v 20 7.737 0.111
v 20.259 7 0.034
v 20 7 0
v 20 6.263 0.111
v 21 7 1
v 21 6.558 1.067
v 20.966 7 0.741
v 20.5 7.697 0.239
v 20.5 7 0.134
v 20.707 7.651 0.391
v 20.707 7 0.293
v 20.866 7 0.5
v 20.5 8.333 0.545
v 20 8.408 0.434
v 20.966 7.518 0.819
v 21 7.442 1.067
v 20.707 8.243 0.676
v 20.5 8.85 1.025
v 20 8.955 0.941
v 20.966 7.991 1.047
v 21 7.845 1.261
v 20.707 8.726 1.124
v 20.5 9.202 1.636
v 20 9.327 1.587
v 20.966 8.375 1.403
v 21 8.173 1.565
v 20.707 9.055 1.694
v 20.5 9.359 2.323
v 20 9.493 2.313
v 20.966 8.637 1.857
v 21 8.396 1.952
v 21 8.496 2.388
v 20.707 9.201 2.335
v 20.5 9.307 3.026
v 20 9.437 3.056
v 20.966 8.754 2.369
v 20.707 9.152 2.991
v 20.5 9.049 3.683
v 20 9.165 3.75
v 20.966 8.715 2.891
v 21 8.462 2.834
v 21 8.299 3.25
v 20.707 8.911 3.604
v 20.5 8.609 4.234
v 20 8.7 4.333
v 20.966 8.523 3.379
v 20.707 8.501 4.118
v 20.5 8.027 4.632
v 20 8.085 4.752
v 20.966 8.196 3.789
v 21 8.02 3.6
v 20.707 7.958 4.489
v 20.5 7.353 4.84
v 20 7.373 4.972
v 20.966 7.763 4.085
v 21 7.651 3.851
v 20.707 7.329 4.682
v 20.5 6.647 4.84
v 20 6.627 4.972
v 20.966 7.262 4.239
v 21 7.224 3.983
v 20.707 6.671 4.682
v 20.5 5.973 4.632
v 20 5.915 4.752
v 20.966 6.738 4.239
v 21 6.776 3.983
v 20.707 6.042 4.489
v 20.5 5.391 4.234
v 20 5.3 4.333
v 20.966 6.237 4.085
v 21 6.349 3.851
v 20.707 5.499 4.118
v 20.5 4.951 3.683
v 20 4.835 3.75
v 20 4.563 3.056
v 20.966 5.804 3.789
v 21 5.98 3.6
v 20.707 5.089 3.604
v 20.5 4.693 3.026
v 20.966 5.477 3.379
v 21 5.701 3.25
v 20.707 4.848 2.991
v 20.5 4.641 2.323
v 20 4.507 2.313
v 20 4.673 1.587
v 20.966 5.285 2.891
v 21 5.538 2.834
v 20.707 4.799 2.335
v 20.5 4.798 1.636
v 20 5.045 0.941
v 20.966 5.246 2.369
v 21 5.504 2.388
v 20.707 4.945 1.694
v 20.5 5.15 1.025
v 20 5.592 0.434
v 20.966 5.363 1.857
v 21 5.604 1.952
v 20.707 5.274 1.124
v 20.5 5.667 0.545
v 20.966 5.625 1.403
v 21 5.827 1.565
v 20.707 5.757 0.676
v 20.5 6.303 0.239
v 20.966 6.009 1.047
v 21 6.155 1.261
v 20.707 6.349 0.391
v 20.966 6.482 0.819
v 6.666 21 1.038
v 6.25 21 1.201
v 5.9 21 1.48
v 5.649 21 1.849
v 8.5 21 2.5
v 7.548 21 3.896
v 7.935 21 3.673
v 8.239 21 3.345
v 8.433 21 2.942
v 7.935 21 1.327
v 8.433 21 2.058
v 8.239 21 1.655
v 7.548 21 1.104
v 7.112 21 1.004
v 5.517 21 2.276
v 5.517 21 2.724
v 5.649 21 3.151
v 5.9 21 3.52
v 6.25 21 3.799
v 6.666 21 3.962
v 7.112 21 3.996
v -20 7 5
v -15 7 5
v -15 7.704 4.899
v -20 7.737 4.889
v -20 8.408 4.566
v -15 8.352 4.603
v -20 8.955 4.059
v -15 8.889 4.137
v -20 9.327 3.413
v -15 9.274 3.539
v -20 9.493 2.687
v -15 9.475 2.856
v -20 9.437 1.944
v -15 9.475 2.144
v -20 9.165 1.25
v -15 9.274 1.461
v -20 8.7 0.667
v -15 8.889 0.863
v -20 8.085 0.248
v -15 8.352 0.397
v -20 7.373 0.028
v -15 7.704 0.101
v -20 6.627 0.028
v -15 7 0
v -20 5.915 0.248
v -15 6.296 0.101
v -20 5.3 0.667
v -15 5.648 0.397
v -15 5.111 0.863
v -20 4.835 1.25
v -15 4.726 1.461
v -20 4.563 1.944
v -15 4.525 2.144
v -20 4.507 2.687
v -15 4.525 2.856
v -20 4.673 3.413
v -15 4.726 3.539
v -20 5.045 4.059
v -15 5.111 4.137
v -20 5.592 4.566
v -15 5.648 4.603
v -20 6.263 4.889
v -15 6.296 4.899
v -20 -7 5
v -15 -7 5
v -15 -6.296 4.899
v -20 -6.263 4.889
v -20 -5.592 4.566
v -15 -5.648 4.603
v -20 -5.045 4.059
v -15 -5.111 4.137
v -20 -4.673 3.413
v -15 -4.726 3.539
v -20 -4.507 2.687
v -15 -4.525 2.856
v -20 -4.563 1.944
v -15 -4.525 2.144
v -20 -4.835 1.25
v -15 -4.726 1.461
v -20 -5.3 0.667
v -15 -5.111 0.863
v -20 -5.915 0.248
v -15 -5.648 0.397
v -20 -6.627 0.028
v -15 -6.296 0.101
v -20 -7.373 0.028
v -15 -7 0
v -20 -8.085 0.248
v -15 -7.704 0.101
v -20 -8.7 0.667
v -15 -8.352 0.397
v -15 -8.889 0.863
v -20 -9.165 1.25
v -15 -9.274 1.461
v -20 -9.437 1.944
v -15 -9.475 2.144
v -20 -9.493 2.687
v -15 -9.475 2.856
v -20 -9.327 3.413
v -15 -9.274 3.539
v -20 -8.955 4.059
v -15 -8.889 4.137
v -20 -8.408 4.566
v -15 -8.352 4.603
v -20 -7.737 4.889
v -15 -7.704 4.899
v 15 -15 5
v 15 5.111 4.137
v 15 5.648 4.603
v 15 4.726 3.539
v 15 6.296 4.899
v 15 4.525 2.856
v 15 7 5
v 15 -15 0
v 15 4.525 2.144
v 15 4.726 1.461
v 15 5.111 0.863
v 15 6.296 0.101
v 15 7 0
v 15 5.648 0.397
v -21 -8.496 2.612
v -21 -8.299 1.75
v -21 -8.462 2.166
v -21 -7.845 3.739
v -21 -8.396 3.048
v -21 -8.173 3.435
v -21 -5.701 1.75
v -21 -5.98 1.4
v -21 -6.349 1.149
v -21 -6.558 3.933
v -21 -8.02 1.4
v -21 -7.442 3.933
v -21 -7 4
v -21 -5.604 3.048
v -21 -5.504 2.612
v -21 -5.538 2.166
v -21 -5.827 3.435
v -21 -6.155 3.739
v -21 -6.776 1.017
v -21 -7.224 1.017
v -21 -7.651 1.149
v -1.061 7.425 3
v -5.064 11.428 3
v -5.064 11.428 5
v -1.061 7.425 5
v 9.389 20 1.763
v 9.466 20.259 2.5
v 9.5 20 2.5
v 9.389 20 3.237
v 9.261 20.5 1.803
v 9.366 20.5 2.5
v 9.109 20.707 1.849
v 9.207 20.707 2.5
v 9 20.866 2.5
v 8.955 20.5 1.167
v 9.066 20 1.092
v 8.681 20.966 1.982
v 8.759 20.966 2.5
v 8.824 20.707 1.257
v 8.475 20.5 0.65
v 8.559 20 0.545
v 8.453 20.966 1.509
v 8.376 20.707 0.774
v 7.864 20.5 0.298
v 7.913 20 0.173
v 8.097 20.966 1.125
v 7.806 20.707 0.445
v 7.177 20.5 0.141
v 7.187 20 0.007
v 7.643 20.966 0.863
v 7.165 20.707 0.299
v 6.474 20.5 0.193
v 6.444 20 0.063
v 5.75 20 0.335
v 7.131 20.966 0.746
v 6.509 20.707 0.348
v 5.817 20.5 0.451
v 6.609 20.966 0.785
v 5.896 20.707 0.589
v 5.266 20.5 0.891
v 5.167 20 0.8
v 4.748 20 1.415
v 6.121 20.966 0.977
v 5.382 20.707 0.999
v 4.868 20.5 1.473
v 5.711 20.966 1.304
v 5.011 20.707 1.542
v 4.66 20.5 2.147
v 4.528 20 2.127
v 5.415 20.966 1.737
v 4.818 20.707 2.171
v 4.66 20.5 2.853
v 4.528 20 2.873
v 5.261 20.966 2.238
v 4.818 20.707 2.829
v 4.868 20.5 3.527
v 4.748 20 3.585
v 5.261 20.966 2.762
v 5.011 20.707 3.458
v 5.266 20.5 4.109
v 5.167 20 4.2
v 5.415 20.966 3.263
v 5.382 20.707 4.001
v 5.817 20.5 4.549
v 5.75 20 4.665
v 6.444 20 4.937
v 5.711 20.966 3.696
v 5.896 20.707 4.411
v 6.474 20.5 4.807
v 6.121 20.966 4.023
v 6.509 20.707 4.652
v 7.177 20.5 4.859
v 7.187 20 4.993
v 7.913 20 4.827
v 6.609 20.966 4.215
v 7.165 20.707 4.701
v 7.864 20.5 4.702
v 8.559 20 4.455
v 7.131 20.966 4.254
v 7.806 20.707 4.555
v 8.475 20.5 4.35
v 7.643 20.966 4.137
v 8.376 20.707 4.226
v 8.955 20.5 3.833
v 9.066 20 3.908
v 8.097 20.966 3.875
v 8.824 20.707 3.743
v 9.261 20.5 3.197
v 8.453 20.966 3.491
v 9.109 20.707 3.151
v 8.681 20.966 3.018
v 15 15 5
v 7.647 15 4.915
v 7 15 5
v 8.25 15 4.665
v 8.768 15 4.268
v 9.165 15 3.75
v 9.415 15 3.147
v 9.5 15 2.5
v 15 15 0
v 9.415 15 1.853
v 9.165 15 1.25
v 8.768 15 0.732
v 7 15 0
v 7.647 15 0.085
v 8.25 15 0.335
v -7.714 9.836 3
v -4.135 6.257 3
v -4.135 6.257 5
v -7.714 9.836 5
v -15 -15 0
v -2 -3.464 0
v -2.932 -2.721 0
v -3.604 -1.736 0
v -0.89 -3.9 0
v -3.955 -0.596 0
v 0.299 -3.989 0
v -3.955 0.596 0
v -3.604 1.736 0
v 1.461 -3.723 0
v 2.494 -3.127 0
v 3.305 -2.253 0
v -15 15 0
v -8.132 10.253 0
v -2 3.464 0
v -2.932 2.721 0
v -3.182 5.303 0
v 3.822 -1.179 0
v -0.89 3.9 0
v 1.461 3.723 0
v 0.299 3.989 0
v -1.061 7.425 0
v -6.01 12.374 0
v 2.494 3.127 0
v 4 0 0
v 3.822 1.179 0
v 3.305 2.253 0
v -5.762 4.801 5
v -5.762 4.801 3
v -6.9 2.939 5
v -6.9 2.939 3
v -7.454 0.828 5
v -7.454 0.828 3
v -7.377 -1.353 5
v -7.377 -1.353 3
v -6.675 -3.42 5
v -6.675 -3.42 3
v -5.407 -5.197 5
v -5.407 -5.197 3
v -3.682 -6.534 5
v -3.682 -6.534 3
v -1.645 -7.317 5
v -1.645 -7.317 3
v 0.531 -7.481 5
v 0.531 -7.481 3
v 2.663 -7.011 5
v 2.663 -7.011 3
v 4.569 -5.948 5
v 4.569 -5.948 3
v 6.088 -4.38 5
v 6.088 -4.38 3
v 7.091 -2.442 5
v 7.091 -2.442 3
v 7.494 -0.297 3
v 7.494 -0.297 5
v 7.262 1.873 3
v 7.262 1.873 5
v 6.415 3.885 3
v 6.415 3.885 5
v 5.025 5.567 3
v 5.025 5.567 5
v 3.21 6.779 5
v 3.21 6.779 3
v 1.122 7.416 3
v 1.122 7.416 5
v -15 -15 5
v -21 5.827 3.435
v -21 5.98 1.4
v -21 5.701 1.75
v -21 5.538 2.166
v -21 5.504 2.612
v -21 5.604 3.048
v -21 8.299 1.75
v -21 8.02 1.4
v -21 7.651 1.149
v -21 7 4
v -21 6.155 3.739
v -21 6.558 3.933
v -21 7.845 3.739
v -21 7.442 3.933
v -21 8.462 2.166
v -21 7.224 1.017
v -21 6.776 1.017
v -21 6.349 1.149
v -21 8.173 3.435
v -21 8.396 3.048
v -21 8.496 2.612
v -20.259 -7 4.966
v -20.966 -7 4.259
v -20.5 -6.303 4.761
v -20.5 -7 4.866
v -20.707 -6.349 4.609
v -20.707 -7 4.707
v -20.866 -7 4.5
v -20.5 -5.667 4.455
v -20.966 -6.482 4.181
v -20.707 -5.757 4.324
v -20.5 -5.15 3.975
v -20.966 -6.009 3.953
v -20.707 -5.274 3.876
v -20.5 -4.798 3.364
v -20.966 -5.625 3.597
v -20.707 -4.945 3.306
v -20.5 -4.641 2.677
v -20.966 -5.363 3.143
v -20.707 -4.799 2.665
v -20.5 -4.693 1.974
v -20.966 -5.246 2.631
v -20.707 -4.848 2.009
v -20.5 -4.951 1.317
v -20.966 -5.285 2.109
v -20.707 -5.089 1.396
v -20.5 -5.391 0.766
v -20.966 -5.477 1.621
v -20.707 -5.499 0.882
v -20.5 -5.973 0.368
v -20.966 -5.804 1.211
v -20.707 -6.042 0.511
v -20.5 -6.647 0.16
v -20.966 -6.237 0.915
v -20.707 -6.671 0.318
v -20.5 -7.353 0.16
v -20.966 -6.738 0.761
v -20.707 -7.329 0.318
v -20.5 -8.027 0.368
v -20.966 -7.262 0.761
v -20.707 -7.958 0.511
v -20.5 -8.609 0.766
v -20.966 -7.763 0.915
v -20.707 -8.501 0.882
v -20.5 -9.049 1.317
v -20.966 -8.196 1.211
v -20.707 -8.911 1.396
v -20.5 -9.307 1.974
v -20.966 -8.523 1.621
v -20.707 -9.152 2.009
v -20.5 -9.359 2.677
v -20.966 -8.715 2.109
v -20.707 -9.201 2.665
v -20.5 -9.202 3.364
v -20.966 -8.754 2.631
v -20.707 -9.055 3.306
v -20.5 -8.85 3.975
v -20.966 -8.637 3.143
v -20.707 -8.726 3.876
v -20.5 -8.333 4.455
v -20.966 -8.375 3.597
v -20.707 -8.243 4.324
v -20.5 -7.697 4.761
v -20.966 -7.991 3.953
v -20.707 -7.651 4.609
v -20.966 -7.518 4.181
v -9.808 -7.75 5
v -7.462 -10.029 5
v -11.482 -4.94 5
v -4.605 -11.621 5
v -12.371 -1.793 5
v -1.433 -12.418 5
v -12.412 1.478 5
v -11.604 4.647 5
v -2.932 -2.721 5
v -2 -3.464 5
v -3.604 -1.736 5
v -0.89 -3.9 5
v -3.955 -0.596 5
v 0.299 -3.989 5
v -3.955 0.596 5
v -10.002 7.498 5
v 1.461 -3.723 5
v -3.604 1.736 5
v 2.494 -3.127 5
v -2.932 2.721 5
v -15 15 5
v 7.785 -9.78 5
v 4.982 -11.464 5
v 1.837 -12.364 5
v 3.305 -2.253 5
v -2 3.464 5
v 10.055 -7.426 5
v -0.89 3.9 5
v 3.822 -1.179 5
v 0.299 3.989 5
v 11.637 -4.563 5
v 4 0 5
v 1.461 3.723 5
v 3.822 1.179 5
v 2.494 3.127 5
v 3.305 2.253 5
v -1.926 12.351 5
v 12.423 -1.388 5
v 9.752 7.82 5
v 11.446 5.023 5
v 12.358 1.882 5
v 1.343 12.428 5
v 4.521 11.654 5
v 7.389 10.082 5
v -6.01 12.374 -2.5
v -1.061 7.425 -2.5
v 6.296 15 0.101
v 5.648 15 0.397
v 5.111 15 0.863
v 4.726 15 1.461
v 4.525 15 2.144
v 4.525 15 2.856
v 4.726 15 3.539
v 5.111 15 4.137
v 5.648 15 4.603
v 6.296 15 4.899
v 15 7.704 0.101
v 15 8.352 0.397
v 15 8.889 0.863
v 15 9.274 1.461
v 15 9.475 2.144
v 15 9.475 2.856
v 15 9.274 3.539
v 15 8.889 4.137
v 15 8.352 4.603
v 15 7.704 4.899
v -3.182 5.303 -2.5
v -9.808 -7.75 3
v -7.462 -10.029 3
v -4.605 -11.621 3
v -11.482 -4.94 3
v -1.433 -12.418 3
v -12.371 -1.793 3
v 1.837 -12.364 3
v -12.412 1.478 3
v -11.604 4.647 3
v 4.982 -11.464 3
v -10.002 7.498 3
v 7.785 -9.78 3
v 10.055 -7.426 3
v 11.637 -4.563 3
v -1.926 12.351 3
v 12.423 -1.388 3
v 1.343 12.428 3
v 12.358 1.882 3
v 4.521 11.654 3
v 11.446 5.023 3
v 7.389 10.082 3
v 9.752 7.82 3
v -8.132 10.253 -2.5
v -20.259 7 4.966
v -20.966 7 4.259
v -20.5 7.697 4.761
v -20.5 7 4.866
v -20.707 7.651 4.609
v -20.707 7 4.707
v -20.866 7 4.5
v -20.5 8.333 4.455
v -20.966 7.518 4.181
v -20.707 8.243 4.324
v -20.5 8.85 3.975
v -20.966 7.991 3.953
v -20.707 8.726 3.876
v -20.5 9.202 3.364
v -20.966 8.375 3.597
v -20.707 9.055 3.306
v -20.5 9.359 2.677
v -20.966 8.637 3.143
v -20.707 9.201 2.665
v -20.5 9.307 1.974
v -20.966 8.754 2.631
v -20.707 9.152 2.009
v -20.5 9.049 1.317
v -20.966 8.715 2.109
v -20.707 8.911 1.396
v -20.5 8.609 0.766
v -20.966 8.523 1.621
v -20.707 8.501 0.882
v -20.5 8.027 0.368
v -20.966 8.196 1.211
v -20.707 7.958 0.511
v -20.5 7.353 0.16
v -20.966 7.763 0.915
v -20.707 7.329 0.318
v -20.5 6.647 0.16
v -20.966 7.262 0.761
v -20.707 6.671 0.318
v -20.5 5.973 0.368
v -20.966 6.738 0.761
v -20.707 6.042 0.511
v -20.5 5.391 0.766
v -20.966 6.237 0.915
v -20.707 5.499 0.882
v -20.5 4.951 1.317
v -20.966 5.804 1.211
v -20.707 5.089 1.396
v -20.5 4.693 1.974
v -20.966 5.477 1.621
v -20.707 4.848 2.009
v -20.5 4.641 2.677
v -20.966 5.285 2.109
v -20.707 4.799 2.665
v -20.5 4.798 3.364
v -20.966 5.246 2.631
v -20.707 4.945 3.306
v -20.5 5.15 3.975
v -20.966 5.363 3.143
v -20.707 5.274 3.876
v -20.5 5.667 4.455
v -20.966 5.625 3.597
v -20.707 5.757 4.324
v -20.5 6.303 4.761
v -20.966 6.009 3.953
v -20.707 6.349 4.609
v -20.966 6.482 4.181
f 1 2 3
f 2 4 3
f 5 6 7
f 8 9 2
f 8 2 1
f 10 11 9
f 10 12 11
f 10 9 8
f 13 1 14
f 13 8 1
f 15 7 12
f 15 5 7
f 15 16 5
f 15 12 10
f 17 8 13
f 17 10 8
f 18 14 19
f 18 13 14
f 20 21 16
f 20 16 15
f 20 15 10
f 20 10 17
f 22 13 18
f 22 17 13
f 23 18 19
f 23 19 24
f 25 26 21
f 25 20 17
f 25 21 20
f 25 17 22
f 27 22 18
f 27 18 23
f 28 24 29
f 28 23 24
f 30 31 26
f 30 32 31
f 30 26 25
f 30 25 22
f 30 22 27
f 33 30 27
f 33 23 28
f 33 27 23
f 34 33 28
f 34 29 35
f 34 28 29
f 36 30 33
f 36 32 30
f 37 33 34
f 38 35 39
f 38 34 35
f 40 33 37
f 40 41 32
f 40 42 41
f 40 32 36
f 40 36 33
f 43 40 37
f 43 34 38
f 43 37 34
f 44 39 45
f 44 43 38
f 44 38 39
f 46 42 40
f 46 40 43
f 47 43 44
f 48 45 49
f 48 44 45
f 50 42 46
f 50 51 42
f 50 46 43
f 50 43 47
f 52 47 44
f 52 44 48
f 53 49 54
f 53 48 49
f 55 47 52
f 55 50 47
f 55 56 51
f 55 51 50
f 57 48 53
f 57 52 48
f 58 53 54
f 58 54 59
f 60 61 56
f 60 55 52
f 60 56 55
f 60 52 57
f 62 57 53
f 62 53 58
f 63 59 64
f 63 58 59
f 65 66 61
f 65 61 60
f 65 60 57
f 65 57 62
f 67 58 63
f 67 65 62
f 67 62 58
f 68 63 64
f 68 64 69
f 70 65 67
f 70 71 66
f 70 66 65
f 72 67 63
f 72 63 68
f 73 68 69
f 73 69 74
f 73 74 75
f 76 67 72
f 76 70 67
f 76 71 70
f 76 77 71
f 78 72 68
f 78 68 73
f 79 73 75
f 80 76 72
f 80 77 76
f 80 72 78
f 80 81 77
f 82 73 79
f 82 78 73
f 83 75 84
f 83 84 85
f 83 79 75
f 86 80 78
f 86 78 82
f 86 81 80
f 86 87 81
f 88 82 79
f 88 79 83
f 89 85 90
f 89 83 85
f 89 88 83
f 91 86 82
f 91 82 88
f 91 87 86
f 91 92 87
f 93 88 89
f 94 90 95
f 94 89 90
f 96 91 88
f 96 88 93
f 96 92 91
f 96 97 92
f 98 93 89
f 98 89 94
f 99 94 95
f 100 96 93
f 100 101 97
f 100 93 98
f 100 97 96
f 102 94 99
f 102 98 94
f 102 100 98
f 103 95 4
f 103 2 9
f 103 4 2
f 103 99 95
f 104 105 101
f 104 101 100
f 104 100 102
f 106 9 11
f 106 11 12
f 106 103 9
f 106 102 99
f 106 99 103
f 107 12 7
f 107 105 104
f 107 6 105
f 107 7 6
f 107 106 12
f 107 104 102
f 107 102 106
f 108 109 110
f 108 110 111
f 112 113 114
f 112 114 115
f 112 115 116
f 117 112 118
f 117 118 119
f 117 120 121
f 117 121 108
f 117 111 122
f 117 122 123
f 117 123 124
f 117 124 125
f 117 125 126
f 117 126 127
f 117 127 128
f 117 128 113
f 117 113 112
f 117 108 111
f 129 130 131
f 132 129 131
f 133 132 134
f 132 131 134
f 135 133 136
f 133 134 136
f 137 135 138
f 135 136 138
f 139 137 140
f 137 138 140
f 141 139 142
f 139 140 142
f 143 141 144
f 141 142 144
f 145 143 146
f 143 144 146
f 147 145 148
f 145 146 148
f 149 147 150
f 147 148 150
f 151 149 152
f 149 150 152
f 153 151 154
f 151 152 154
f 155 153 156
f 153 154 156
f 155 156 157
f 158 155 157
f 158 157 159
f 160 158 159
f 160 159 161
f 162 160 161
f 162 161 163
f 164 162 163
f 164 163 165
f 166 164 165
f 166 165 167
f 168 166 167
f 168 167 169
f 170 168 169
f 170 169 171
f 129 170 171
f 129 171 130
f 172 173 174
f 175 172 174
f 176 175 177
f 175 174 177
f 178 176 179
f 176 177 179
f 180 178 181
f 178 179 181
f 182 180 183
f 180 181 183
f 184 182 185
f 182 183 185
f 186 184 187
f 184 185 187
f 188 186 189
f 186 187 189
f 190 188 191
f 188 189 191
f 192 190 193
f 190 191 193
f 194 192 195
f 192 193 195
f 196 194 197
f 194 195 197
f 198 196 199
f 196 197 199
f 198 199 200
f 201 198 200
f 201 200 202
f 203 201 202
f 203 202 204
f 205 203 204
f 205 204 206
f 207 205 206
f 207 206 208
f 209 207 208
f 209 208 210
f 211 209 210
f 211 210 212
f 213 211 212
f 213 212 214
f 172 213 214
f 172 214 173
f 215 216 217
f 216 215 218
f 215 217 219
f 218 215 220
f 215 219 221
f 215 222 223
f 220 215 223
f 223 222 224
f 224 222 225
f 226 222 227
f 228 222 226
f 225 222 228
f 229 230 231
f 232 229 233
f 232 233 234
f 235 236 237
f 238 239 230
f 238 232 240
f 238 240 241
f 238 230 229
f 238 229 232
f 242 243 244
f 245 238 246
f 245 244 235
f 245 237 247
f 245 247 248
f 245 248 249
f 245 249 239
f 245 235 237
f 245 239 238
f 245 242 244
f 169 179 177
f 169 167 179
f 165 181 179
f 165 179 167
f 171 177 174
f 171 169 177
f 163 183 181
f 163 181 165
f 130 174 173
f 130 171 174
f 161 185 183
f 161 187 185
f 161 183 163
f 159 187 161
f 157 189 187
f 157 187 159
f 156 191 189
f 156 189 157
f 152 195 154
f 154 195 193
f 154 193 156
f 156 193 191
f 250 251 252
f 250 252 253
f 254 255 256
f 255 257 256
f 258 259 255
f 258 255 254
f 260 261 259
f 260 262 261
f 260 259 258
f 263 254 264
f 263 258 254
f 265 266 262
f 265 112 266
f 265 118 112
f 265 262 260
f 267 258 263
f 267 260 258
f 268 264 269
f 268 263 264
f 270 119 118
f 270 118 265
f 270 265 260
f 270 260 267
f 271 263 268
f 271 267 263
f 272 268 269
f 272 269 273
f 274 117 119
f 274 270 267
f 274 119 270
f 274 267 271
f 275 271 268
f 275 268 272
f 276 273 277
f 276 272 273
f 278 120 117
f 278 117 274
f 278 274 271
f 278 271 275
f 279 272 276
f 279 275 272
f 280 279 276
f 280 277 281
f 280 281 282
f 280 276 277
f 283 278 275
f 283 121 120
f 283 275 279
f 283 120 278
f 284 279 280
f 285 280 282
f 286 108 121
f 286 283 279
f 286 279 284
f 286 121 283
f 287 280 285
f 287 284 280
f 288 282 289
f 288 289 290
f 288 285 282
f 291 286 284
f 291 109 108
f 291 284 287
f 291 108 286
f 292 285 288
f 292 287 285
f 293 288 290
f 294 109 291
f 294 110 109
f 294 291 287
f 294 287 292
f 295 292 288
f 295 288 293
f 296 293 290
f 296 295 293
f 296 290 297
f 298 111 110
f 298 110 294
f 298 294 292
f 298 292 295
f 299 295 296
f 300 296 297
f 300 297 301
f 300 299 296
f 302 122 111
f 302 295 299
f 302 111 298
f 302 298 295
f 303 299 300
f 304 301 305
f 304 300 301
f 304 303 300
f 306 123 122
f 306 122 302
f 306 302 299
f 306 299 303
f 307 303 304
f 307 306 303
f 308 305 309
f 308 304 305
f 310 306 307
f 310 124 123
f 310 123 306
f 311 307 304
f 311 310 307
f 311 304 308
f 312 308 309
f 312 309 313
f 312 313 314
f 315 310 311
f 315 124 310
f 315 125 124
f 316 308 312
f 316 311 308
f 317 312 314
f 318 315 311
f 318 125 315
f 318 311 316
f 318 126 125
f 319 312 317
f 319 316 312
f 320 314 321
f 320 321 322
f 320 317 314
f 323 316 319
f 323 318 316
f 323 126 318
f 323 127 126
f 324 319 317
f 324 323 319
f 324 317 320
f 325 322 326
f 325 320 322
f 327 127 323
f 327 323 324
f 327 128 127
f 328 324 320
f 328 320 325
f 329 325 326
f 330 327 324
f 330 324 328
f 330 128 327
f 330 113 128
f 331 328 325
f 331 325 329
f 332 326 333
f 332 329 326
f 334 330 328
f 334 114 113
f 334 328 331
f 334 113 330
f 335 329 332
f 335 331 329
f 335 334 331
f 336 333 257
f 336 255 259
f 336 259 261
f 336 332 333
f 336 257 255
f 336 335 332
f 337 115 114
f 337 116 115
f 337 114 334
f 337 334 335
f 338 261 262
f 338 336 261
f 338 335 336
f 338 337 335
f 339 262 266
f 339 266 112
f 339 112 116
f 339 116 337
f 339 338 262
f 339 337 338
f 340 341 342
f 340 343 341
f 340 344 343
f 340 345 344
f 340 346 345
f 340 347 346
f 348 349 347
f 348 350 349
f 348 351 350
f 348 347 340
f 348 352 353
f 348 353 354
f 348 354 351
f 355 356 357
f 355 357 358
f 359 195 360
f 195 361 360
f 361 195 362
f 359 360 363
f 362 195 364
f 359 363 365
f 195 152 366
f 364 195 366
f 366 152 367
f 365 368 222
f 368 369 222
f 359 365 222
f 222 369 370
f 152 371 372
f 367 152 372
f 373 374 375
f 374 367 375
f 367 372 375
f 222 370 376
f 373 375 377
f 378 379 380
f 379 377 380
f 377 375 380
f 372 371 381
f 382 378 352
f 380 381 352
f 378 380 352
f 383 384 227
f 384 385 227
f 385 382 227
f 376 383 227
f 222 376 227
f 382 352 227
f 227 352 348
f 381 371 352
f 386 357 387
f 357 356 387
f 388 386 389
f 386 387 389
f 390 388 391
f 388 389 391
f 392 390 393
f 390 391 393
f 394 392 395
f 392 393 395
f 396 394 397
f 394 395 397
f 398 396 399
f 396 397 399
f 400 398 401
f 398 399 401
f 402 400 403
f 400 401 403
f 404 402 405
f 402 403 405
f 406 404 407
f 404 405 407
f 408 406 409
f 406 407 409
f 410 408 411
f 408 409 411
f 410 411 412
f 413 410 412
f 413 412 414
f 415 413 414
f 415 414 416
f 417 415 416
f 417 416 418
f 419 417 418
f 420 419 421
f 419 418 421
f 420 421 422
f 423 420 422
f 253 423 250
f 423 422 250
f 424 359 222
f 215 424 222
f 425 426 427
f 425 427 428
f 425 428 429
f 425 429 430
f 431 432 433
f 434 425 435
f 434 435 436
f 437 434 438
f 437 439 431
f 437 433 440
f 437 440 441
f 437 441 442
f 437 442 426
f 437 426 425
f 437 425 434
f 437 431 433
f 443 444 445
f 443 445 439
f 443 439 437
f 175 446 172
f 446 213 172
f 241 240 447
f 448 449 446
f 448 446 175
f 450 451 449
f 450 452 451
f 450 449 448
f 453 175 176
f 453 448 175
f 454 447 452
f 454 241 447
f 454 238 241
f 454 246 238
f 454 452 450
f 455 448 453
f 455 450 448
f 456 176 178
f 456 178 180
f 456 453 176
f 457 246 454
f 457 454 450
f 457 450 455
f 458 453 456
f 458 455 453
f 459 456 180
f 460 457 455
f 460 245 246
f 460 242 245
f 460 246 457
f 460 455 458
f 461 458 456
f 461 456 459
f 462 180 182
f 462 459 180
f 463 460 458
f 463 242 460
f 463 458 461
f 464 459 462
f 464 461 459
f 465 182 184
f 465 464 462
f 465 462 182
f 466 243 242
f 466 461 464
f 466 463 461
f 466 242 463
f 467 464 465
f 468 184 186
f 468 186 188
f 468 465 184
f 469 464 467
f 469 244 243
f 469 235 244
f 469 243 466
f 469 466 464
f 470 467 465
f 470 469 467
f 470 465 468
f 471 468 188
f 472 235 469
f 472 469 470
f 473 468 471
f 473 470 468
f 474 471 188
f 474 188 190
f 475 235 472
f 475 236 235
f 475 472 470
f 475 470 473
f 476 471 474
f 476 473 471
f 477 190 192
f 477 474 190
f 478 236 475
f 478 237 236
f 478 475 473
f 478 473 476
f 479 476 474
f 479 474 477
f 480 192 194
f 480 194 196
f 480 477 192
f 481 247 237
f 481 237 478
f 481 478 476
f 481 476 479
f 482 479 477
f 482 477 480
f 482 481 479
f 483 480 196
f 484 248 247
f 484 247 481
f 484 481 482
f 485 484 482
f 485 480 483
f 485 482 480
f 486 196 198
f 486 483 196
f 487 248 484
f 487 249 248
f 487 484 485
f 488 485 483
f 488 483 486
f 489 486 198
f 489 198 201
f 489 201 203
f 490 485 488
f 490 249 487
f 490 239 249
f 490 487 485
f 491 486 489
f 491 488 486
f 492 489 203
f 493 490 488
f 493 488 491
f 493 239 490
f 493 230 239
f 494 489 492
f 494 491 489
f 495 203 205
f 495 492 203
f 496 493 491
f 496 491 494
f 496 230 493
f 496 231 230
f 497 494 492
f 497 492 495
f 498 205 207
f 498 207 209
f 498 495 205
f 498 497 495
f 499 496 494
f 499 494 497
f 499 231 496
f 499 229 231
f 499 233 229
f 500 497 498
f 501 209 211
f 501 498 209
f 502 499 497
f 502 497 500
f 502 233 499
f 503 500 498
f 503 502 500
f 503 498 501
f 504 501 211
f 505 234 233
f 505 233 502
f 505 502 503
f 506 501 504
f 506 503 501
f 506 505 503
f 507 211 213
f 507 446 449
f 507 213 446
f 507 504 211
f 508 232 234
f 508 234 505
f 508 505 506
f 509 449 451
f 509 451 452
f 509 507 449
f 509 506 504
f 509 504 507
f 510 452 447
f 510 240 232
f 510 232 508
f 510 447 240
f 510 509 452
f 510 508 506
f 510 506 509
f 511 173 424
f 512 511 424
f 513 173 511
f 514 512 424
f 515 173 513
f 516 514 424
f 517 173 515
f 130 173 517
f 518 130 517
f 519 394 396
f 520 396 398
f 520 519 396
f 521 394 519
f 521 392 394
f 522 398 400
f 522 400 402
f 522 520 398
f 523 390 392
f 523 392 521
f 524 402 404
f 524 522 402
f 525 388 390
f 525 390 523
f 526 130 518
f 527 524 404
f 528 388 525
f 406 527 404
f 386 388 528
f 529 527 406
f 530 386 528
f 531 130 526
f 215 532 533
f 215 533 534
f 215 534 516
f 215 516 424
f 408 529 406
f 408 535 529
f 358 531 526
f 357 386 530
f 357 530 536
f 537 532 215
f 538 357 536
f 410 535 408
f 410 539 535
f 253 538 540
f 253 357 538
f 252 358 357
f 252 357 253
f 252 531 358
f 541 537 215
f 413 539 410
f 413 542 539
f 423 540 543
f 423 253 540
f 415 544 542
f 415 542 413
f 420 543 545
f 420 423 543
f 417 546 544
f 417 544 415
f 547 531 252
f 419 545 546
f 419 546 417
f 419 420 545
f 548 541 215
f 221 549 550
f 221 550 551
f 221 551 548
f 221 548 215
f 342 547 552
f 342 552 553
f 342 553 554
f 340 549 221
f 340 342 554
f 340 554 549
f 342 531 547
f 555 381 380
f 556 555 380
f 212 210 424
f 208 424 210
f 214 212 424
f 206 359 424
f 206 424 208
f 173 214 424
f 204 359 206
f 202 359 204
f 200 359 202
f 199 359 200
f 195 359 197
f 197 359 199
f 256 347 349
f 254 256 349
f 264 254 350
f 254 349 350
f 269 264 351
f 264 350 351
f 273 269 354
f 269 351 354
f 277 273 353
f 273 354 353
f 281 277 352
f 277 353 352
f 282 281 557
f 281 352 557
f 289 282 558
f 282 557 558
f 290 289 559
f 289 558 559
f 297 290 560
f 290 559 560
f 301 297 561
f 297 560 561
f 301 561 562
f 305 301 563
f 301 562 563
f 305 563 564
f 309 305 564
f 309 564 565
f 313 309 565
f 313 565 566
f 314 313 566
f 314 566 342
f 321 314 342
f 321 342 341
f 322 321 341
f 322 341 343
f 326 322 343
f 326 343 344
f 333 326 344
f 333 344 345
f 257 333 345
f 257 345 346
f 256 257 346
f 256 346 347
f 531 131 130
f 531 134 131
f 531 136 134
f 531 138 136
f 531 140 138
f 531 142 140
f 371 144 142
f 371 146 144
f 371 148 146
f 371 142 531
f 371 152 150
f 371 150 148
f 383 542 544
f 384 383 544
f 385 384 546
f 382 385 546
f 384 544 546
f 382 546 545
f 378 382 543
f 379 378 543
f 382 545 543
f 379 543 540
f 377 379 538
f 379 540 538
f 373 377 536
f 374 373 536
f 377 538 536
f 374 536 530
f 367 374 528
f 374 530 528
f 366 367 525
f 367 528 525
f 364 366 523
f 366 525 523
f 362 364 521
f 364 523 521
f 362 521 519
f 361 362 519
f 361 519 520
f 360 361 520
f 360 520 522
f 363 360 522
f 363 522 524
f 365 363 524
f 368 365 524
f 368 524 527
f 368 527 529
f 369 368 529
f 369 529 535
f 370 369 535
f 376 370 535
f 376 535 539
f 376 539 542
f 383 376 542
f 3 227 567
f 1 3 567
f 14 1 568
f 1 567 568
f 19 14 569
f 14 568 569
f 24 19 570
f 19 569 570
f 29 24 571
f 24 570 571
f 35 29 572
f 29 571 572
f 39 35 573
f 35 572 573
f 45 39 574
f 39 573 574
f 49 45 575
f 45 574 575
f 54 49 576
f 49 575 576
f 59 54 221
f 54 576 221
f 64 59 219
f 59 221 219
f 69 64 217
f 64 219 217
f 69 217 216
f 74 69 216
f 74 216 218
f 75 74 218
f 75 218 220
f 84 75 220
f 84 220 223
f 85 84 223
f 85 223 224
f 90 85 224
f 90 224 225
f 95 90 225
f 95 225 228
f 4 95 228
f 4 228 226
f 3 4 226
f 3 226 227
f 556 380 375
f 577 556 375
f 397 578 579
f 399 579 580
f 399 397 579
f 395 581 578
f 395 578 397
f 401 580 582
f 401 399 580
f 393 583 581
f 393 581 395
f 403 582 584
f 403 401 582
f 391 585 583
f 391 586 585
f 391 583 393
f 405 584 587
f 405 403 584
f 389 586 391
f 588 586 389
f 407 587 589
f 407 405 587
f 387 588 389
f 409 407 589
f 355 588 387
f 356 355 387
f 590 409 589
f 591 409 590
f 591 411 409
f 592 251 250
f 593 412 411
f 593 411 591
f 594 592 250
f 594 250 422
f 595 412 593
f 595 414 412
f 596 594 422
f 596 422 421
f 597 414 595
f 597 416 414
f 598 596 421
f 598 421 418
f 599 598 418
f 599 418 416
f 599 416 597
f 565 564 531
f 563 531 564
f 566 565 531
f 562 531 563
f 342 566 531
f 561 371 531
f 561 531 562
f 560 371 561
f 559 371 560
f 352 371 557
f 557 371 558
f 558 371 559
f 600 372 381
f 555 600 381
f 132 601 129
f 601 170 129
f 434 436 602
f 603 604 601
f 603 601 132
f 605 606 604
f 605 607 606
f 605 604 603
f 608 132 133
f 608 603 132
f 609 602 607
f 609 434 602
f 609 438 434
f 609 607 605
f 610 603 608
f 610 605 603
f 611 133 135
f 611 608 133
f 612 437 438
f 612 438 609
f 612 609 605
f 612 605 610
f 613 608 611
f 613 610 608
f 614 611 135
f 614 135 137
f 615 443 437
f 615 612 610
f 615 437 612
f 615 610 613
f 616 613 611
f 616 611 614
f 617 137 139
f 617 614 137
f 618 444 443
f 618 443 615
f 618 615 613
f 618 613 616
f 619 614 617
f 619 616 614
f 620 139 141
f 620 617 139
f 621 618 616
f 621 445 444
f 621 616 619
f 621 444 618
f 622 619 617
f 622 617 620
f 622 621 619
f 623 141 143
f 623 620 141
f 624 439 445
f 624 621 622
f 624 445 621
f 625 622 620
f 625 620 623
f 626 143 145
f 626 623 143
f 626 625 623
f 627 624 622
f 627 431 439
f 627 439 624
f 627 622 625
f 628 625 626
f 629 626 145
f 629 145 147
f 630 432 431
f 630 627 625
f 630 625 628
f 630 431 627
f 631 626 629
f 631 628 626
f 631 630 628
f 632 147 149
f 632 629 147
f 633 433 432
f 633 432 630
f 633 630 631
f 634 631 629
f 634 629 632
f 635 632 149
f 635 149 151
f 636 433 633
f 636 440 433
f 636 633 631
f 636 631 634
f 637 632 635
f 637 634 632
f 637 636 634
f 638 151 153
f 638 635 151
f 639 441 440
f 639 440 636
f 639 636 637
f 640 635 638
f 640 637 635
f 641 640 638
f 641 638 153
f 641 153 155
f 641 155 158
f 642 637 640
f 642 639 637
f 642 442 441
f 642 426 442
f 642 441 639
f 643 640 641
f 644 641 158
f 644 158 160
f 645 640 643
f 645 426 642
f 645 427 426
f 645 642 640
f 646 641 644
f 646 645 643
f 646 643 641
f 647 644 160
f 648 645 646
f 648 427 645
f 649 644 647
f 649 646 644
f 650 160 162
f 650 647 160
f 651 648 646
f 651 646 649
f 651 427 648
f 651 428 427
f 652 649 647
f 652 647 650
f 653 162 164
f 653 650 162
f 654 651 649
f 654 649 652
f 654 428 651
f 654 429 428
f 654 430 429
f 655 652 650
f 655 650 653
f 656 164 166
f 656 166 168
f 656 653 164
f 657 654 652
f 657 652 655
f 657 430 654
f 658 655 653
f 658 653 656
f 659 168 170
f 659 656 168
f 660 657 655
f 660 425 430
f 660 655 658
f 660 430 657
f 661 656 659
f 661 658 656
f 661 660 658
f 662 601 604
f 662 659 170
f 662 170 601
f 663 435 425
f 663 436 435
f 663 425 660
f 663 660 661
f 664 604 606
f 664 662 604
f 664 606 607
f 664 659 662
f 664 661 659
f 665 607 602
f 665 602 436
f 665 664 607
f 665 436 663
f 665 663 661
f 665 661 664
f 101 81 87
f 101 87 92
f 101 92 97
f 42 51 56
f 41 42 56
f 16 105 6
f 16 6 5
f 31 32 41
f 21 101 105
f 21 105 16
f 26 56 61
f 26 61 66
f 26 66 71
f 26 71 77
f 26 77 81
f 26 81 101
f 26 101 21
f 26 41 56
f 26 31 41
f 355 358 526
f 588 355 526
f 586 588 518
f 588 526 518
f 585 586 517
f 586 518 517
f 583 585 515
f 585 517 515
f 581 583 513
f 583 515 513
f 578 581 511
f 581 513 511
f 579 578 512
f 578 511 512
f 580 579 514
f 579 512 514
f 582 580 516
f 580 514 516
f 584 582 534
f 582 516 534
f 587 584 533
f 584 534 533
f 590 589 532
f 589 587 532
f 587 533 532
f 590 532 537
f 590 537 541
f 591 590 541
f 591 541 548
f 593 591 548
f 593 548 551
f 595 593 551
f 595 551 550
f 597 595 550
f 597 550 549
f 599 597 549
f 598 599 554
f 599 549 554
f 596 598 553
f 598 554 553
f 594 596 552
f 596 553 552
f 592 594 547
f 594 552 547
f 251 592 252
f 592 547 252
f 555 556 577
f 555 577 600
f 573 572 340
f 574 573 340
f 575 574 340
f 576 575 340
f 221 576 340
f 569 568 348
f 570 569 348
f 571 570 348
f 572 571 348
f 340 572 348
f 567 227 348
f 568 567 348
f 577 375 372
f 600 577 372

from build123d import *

# Parameters (mm, degrees)
ESQUISSE2_W              = 30
ESQUISSE2_H              = 30
BOSS_EXTRU_1_DEPTH       = 5
ESQUISSE16_R             = 2.5
BOSS_EXTRU_7_DEPTH       = 6
CONG_3_R                 = 1
ESQUISSE18_R             = 2.5
BOSS_EXTRU_9_DEPTH       = 6
CONG_5_R                 = 1
ESQUISSE8_R              = 12.5
ENL_V_MAT_EXTRU_1_DEPTH  = 2
ESQUISSE19_R             = 7.5
BOSS_EXTRU_10_DEPTH      = 2
ESQUISSE33_R             = 4
ENL_V_MAT_EXTRU_3_DEPTH  = 6
ESQUISSE35_R             = 2.5
BOSS_EXTRU_26_DEPTH      = 6
CONG_6_R                 = 1
BOSS_EXTRU_27_DEPTH      = 2
BOSS_EXTRU_27_DEPTH_BACK = 5.5


with BuildPart() as part:
    # Esquisse2 → Boss.-Extru.1 (new body)
    with BuildSketch(Plane.XY):
        Rectangle(ESQUISSE2_W, ESQUISSE2_H)
    extrude(amount=BOSS_EXTRU_1_DEPTH)

    # Esquisse16 → Boss.-Extru.7 (add)
    with BuildSketch(Plane.ZY.offset(15)):
        with Locations((2.5, 7)):
            Circle(ESQUISSE16_R)
        with Locations((2.5, -7)):
            Circle(ESQUISSE16_R)
    extrude(amount=BOSS_EXTRU_7_DEPTH)

    # Congé3
    cong_3_edges = [part.edges().sort_by_distance(p)[0] for p in [
        (-21, 7, 0),
        (-21, -7, 0),
    ]]
    fillet(cong_3_edges, radius=CONG_3_R)

    # Esquisse18 → Boss.-Extru.9 (add)
    with BuildSketch(Plane(origin=(15, 0, 0), x_dir=(0, 0, -1), z_dir=(1, 0, 0))):
        with Locations((-2.5, 7)):
            Circle(ESQUISSE18_R)
    extrude(amount=BOSS_EXTRU_9_DEPTH)

    # Congé5
    cong_5_edges = [part.edges().sort_by_distance(p)[0] for p in [
        (21, 7, 5),
    ]]
    fillet(cong_5_edges, radius=CONG_5_R)

    # Esquisse8 → Enlèv. mat.-Extru.1 (cut)
    with BuildSketch(Plane.XY.offset(5)):
        Circle(ESQUISSE8_R)
    extrude(amount=-ENL_V_MAT_EXTRU_1_DEPTH, mode=Mode.SUBTRACT)

    # Esquisse19 → Boss.-Extru.10 (add)
    with BuildSketch(Plane.XY.offset(3)):
        Circle(ESQUISSE19_R)
    extrude(amount=BOSS_EXTRU_10_DEPTH)

    # Esquisse33 → Enlèv. mat.-Extru.3 (cut, through all)
    with BuildSketch(Plane.XY.offset(5)):
        Circle(ESQUISSE33_R)
    extrude(amount=-ENL_V_MAT_EXTRU_3_DEPTH, mode=Mode.SUBTRACT)

    # Esquisse35 → Boss.-Extru.26 (add)
    with BuildSketch(Plane(origin=(0, 15, 0), x_dir=(1, 0, 0), z_dir=(0, 1, 0))):
        with Locations((7, -2.5)):
            Circle(ESQUISSE35_R)
    extrude(amount=BOSS_EXTRU_26_DEPTH)

    # Congé6
    cong_6_edges = [part.edges().sort_by_distance(p)[0] for p in [
        (4.5, 21, 2.5),
    ]]
    fillet(cong_6_edges, radius=CONG_6_R)

    # Esquisse31 → Boss.-Extru.27 (add, two sides)
    with BuildSketch(Plane.XY.offset(3)) as boss_extru_27_sk:
        Polygon((-8.131727984, 10.253048327), (-6.01040764, 12.374368671), (-1.060660172, 7.424621202), (-3.181980515, 5.303300859), align=None)
    extrude(amount=BOSS_EXTRU_27_DEPTH)
    extrude(boss_extru_27_sk.sketch, amount=-BOSS_EXTRU_27_DEPTH_BACK)


solid = part.part
